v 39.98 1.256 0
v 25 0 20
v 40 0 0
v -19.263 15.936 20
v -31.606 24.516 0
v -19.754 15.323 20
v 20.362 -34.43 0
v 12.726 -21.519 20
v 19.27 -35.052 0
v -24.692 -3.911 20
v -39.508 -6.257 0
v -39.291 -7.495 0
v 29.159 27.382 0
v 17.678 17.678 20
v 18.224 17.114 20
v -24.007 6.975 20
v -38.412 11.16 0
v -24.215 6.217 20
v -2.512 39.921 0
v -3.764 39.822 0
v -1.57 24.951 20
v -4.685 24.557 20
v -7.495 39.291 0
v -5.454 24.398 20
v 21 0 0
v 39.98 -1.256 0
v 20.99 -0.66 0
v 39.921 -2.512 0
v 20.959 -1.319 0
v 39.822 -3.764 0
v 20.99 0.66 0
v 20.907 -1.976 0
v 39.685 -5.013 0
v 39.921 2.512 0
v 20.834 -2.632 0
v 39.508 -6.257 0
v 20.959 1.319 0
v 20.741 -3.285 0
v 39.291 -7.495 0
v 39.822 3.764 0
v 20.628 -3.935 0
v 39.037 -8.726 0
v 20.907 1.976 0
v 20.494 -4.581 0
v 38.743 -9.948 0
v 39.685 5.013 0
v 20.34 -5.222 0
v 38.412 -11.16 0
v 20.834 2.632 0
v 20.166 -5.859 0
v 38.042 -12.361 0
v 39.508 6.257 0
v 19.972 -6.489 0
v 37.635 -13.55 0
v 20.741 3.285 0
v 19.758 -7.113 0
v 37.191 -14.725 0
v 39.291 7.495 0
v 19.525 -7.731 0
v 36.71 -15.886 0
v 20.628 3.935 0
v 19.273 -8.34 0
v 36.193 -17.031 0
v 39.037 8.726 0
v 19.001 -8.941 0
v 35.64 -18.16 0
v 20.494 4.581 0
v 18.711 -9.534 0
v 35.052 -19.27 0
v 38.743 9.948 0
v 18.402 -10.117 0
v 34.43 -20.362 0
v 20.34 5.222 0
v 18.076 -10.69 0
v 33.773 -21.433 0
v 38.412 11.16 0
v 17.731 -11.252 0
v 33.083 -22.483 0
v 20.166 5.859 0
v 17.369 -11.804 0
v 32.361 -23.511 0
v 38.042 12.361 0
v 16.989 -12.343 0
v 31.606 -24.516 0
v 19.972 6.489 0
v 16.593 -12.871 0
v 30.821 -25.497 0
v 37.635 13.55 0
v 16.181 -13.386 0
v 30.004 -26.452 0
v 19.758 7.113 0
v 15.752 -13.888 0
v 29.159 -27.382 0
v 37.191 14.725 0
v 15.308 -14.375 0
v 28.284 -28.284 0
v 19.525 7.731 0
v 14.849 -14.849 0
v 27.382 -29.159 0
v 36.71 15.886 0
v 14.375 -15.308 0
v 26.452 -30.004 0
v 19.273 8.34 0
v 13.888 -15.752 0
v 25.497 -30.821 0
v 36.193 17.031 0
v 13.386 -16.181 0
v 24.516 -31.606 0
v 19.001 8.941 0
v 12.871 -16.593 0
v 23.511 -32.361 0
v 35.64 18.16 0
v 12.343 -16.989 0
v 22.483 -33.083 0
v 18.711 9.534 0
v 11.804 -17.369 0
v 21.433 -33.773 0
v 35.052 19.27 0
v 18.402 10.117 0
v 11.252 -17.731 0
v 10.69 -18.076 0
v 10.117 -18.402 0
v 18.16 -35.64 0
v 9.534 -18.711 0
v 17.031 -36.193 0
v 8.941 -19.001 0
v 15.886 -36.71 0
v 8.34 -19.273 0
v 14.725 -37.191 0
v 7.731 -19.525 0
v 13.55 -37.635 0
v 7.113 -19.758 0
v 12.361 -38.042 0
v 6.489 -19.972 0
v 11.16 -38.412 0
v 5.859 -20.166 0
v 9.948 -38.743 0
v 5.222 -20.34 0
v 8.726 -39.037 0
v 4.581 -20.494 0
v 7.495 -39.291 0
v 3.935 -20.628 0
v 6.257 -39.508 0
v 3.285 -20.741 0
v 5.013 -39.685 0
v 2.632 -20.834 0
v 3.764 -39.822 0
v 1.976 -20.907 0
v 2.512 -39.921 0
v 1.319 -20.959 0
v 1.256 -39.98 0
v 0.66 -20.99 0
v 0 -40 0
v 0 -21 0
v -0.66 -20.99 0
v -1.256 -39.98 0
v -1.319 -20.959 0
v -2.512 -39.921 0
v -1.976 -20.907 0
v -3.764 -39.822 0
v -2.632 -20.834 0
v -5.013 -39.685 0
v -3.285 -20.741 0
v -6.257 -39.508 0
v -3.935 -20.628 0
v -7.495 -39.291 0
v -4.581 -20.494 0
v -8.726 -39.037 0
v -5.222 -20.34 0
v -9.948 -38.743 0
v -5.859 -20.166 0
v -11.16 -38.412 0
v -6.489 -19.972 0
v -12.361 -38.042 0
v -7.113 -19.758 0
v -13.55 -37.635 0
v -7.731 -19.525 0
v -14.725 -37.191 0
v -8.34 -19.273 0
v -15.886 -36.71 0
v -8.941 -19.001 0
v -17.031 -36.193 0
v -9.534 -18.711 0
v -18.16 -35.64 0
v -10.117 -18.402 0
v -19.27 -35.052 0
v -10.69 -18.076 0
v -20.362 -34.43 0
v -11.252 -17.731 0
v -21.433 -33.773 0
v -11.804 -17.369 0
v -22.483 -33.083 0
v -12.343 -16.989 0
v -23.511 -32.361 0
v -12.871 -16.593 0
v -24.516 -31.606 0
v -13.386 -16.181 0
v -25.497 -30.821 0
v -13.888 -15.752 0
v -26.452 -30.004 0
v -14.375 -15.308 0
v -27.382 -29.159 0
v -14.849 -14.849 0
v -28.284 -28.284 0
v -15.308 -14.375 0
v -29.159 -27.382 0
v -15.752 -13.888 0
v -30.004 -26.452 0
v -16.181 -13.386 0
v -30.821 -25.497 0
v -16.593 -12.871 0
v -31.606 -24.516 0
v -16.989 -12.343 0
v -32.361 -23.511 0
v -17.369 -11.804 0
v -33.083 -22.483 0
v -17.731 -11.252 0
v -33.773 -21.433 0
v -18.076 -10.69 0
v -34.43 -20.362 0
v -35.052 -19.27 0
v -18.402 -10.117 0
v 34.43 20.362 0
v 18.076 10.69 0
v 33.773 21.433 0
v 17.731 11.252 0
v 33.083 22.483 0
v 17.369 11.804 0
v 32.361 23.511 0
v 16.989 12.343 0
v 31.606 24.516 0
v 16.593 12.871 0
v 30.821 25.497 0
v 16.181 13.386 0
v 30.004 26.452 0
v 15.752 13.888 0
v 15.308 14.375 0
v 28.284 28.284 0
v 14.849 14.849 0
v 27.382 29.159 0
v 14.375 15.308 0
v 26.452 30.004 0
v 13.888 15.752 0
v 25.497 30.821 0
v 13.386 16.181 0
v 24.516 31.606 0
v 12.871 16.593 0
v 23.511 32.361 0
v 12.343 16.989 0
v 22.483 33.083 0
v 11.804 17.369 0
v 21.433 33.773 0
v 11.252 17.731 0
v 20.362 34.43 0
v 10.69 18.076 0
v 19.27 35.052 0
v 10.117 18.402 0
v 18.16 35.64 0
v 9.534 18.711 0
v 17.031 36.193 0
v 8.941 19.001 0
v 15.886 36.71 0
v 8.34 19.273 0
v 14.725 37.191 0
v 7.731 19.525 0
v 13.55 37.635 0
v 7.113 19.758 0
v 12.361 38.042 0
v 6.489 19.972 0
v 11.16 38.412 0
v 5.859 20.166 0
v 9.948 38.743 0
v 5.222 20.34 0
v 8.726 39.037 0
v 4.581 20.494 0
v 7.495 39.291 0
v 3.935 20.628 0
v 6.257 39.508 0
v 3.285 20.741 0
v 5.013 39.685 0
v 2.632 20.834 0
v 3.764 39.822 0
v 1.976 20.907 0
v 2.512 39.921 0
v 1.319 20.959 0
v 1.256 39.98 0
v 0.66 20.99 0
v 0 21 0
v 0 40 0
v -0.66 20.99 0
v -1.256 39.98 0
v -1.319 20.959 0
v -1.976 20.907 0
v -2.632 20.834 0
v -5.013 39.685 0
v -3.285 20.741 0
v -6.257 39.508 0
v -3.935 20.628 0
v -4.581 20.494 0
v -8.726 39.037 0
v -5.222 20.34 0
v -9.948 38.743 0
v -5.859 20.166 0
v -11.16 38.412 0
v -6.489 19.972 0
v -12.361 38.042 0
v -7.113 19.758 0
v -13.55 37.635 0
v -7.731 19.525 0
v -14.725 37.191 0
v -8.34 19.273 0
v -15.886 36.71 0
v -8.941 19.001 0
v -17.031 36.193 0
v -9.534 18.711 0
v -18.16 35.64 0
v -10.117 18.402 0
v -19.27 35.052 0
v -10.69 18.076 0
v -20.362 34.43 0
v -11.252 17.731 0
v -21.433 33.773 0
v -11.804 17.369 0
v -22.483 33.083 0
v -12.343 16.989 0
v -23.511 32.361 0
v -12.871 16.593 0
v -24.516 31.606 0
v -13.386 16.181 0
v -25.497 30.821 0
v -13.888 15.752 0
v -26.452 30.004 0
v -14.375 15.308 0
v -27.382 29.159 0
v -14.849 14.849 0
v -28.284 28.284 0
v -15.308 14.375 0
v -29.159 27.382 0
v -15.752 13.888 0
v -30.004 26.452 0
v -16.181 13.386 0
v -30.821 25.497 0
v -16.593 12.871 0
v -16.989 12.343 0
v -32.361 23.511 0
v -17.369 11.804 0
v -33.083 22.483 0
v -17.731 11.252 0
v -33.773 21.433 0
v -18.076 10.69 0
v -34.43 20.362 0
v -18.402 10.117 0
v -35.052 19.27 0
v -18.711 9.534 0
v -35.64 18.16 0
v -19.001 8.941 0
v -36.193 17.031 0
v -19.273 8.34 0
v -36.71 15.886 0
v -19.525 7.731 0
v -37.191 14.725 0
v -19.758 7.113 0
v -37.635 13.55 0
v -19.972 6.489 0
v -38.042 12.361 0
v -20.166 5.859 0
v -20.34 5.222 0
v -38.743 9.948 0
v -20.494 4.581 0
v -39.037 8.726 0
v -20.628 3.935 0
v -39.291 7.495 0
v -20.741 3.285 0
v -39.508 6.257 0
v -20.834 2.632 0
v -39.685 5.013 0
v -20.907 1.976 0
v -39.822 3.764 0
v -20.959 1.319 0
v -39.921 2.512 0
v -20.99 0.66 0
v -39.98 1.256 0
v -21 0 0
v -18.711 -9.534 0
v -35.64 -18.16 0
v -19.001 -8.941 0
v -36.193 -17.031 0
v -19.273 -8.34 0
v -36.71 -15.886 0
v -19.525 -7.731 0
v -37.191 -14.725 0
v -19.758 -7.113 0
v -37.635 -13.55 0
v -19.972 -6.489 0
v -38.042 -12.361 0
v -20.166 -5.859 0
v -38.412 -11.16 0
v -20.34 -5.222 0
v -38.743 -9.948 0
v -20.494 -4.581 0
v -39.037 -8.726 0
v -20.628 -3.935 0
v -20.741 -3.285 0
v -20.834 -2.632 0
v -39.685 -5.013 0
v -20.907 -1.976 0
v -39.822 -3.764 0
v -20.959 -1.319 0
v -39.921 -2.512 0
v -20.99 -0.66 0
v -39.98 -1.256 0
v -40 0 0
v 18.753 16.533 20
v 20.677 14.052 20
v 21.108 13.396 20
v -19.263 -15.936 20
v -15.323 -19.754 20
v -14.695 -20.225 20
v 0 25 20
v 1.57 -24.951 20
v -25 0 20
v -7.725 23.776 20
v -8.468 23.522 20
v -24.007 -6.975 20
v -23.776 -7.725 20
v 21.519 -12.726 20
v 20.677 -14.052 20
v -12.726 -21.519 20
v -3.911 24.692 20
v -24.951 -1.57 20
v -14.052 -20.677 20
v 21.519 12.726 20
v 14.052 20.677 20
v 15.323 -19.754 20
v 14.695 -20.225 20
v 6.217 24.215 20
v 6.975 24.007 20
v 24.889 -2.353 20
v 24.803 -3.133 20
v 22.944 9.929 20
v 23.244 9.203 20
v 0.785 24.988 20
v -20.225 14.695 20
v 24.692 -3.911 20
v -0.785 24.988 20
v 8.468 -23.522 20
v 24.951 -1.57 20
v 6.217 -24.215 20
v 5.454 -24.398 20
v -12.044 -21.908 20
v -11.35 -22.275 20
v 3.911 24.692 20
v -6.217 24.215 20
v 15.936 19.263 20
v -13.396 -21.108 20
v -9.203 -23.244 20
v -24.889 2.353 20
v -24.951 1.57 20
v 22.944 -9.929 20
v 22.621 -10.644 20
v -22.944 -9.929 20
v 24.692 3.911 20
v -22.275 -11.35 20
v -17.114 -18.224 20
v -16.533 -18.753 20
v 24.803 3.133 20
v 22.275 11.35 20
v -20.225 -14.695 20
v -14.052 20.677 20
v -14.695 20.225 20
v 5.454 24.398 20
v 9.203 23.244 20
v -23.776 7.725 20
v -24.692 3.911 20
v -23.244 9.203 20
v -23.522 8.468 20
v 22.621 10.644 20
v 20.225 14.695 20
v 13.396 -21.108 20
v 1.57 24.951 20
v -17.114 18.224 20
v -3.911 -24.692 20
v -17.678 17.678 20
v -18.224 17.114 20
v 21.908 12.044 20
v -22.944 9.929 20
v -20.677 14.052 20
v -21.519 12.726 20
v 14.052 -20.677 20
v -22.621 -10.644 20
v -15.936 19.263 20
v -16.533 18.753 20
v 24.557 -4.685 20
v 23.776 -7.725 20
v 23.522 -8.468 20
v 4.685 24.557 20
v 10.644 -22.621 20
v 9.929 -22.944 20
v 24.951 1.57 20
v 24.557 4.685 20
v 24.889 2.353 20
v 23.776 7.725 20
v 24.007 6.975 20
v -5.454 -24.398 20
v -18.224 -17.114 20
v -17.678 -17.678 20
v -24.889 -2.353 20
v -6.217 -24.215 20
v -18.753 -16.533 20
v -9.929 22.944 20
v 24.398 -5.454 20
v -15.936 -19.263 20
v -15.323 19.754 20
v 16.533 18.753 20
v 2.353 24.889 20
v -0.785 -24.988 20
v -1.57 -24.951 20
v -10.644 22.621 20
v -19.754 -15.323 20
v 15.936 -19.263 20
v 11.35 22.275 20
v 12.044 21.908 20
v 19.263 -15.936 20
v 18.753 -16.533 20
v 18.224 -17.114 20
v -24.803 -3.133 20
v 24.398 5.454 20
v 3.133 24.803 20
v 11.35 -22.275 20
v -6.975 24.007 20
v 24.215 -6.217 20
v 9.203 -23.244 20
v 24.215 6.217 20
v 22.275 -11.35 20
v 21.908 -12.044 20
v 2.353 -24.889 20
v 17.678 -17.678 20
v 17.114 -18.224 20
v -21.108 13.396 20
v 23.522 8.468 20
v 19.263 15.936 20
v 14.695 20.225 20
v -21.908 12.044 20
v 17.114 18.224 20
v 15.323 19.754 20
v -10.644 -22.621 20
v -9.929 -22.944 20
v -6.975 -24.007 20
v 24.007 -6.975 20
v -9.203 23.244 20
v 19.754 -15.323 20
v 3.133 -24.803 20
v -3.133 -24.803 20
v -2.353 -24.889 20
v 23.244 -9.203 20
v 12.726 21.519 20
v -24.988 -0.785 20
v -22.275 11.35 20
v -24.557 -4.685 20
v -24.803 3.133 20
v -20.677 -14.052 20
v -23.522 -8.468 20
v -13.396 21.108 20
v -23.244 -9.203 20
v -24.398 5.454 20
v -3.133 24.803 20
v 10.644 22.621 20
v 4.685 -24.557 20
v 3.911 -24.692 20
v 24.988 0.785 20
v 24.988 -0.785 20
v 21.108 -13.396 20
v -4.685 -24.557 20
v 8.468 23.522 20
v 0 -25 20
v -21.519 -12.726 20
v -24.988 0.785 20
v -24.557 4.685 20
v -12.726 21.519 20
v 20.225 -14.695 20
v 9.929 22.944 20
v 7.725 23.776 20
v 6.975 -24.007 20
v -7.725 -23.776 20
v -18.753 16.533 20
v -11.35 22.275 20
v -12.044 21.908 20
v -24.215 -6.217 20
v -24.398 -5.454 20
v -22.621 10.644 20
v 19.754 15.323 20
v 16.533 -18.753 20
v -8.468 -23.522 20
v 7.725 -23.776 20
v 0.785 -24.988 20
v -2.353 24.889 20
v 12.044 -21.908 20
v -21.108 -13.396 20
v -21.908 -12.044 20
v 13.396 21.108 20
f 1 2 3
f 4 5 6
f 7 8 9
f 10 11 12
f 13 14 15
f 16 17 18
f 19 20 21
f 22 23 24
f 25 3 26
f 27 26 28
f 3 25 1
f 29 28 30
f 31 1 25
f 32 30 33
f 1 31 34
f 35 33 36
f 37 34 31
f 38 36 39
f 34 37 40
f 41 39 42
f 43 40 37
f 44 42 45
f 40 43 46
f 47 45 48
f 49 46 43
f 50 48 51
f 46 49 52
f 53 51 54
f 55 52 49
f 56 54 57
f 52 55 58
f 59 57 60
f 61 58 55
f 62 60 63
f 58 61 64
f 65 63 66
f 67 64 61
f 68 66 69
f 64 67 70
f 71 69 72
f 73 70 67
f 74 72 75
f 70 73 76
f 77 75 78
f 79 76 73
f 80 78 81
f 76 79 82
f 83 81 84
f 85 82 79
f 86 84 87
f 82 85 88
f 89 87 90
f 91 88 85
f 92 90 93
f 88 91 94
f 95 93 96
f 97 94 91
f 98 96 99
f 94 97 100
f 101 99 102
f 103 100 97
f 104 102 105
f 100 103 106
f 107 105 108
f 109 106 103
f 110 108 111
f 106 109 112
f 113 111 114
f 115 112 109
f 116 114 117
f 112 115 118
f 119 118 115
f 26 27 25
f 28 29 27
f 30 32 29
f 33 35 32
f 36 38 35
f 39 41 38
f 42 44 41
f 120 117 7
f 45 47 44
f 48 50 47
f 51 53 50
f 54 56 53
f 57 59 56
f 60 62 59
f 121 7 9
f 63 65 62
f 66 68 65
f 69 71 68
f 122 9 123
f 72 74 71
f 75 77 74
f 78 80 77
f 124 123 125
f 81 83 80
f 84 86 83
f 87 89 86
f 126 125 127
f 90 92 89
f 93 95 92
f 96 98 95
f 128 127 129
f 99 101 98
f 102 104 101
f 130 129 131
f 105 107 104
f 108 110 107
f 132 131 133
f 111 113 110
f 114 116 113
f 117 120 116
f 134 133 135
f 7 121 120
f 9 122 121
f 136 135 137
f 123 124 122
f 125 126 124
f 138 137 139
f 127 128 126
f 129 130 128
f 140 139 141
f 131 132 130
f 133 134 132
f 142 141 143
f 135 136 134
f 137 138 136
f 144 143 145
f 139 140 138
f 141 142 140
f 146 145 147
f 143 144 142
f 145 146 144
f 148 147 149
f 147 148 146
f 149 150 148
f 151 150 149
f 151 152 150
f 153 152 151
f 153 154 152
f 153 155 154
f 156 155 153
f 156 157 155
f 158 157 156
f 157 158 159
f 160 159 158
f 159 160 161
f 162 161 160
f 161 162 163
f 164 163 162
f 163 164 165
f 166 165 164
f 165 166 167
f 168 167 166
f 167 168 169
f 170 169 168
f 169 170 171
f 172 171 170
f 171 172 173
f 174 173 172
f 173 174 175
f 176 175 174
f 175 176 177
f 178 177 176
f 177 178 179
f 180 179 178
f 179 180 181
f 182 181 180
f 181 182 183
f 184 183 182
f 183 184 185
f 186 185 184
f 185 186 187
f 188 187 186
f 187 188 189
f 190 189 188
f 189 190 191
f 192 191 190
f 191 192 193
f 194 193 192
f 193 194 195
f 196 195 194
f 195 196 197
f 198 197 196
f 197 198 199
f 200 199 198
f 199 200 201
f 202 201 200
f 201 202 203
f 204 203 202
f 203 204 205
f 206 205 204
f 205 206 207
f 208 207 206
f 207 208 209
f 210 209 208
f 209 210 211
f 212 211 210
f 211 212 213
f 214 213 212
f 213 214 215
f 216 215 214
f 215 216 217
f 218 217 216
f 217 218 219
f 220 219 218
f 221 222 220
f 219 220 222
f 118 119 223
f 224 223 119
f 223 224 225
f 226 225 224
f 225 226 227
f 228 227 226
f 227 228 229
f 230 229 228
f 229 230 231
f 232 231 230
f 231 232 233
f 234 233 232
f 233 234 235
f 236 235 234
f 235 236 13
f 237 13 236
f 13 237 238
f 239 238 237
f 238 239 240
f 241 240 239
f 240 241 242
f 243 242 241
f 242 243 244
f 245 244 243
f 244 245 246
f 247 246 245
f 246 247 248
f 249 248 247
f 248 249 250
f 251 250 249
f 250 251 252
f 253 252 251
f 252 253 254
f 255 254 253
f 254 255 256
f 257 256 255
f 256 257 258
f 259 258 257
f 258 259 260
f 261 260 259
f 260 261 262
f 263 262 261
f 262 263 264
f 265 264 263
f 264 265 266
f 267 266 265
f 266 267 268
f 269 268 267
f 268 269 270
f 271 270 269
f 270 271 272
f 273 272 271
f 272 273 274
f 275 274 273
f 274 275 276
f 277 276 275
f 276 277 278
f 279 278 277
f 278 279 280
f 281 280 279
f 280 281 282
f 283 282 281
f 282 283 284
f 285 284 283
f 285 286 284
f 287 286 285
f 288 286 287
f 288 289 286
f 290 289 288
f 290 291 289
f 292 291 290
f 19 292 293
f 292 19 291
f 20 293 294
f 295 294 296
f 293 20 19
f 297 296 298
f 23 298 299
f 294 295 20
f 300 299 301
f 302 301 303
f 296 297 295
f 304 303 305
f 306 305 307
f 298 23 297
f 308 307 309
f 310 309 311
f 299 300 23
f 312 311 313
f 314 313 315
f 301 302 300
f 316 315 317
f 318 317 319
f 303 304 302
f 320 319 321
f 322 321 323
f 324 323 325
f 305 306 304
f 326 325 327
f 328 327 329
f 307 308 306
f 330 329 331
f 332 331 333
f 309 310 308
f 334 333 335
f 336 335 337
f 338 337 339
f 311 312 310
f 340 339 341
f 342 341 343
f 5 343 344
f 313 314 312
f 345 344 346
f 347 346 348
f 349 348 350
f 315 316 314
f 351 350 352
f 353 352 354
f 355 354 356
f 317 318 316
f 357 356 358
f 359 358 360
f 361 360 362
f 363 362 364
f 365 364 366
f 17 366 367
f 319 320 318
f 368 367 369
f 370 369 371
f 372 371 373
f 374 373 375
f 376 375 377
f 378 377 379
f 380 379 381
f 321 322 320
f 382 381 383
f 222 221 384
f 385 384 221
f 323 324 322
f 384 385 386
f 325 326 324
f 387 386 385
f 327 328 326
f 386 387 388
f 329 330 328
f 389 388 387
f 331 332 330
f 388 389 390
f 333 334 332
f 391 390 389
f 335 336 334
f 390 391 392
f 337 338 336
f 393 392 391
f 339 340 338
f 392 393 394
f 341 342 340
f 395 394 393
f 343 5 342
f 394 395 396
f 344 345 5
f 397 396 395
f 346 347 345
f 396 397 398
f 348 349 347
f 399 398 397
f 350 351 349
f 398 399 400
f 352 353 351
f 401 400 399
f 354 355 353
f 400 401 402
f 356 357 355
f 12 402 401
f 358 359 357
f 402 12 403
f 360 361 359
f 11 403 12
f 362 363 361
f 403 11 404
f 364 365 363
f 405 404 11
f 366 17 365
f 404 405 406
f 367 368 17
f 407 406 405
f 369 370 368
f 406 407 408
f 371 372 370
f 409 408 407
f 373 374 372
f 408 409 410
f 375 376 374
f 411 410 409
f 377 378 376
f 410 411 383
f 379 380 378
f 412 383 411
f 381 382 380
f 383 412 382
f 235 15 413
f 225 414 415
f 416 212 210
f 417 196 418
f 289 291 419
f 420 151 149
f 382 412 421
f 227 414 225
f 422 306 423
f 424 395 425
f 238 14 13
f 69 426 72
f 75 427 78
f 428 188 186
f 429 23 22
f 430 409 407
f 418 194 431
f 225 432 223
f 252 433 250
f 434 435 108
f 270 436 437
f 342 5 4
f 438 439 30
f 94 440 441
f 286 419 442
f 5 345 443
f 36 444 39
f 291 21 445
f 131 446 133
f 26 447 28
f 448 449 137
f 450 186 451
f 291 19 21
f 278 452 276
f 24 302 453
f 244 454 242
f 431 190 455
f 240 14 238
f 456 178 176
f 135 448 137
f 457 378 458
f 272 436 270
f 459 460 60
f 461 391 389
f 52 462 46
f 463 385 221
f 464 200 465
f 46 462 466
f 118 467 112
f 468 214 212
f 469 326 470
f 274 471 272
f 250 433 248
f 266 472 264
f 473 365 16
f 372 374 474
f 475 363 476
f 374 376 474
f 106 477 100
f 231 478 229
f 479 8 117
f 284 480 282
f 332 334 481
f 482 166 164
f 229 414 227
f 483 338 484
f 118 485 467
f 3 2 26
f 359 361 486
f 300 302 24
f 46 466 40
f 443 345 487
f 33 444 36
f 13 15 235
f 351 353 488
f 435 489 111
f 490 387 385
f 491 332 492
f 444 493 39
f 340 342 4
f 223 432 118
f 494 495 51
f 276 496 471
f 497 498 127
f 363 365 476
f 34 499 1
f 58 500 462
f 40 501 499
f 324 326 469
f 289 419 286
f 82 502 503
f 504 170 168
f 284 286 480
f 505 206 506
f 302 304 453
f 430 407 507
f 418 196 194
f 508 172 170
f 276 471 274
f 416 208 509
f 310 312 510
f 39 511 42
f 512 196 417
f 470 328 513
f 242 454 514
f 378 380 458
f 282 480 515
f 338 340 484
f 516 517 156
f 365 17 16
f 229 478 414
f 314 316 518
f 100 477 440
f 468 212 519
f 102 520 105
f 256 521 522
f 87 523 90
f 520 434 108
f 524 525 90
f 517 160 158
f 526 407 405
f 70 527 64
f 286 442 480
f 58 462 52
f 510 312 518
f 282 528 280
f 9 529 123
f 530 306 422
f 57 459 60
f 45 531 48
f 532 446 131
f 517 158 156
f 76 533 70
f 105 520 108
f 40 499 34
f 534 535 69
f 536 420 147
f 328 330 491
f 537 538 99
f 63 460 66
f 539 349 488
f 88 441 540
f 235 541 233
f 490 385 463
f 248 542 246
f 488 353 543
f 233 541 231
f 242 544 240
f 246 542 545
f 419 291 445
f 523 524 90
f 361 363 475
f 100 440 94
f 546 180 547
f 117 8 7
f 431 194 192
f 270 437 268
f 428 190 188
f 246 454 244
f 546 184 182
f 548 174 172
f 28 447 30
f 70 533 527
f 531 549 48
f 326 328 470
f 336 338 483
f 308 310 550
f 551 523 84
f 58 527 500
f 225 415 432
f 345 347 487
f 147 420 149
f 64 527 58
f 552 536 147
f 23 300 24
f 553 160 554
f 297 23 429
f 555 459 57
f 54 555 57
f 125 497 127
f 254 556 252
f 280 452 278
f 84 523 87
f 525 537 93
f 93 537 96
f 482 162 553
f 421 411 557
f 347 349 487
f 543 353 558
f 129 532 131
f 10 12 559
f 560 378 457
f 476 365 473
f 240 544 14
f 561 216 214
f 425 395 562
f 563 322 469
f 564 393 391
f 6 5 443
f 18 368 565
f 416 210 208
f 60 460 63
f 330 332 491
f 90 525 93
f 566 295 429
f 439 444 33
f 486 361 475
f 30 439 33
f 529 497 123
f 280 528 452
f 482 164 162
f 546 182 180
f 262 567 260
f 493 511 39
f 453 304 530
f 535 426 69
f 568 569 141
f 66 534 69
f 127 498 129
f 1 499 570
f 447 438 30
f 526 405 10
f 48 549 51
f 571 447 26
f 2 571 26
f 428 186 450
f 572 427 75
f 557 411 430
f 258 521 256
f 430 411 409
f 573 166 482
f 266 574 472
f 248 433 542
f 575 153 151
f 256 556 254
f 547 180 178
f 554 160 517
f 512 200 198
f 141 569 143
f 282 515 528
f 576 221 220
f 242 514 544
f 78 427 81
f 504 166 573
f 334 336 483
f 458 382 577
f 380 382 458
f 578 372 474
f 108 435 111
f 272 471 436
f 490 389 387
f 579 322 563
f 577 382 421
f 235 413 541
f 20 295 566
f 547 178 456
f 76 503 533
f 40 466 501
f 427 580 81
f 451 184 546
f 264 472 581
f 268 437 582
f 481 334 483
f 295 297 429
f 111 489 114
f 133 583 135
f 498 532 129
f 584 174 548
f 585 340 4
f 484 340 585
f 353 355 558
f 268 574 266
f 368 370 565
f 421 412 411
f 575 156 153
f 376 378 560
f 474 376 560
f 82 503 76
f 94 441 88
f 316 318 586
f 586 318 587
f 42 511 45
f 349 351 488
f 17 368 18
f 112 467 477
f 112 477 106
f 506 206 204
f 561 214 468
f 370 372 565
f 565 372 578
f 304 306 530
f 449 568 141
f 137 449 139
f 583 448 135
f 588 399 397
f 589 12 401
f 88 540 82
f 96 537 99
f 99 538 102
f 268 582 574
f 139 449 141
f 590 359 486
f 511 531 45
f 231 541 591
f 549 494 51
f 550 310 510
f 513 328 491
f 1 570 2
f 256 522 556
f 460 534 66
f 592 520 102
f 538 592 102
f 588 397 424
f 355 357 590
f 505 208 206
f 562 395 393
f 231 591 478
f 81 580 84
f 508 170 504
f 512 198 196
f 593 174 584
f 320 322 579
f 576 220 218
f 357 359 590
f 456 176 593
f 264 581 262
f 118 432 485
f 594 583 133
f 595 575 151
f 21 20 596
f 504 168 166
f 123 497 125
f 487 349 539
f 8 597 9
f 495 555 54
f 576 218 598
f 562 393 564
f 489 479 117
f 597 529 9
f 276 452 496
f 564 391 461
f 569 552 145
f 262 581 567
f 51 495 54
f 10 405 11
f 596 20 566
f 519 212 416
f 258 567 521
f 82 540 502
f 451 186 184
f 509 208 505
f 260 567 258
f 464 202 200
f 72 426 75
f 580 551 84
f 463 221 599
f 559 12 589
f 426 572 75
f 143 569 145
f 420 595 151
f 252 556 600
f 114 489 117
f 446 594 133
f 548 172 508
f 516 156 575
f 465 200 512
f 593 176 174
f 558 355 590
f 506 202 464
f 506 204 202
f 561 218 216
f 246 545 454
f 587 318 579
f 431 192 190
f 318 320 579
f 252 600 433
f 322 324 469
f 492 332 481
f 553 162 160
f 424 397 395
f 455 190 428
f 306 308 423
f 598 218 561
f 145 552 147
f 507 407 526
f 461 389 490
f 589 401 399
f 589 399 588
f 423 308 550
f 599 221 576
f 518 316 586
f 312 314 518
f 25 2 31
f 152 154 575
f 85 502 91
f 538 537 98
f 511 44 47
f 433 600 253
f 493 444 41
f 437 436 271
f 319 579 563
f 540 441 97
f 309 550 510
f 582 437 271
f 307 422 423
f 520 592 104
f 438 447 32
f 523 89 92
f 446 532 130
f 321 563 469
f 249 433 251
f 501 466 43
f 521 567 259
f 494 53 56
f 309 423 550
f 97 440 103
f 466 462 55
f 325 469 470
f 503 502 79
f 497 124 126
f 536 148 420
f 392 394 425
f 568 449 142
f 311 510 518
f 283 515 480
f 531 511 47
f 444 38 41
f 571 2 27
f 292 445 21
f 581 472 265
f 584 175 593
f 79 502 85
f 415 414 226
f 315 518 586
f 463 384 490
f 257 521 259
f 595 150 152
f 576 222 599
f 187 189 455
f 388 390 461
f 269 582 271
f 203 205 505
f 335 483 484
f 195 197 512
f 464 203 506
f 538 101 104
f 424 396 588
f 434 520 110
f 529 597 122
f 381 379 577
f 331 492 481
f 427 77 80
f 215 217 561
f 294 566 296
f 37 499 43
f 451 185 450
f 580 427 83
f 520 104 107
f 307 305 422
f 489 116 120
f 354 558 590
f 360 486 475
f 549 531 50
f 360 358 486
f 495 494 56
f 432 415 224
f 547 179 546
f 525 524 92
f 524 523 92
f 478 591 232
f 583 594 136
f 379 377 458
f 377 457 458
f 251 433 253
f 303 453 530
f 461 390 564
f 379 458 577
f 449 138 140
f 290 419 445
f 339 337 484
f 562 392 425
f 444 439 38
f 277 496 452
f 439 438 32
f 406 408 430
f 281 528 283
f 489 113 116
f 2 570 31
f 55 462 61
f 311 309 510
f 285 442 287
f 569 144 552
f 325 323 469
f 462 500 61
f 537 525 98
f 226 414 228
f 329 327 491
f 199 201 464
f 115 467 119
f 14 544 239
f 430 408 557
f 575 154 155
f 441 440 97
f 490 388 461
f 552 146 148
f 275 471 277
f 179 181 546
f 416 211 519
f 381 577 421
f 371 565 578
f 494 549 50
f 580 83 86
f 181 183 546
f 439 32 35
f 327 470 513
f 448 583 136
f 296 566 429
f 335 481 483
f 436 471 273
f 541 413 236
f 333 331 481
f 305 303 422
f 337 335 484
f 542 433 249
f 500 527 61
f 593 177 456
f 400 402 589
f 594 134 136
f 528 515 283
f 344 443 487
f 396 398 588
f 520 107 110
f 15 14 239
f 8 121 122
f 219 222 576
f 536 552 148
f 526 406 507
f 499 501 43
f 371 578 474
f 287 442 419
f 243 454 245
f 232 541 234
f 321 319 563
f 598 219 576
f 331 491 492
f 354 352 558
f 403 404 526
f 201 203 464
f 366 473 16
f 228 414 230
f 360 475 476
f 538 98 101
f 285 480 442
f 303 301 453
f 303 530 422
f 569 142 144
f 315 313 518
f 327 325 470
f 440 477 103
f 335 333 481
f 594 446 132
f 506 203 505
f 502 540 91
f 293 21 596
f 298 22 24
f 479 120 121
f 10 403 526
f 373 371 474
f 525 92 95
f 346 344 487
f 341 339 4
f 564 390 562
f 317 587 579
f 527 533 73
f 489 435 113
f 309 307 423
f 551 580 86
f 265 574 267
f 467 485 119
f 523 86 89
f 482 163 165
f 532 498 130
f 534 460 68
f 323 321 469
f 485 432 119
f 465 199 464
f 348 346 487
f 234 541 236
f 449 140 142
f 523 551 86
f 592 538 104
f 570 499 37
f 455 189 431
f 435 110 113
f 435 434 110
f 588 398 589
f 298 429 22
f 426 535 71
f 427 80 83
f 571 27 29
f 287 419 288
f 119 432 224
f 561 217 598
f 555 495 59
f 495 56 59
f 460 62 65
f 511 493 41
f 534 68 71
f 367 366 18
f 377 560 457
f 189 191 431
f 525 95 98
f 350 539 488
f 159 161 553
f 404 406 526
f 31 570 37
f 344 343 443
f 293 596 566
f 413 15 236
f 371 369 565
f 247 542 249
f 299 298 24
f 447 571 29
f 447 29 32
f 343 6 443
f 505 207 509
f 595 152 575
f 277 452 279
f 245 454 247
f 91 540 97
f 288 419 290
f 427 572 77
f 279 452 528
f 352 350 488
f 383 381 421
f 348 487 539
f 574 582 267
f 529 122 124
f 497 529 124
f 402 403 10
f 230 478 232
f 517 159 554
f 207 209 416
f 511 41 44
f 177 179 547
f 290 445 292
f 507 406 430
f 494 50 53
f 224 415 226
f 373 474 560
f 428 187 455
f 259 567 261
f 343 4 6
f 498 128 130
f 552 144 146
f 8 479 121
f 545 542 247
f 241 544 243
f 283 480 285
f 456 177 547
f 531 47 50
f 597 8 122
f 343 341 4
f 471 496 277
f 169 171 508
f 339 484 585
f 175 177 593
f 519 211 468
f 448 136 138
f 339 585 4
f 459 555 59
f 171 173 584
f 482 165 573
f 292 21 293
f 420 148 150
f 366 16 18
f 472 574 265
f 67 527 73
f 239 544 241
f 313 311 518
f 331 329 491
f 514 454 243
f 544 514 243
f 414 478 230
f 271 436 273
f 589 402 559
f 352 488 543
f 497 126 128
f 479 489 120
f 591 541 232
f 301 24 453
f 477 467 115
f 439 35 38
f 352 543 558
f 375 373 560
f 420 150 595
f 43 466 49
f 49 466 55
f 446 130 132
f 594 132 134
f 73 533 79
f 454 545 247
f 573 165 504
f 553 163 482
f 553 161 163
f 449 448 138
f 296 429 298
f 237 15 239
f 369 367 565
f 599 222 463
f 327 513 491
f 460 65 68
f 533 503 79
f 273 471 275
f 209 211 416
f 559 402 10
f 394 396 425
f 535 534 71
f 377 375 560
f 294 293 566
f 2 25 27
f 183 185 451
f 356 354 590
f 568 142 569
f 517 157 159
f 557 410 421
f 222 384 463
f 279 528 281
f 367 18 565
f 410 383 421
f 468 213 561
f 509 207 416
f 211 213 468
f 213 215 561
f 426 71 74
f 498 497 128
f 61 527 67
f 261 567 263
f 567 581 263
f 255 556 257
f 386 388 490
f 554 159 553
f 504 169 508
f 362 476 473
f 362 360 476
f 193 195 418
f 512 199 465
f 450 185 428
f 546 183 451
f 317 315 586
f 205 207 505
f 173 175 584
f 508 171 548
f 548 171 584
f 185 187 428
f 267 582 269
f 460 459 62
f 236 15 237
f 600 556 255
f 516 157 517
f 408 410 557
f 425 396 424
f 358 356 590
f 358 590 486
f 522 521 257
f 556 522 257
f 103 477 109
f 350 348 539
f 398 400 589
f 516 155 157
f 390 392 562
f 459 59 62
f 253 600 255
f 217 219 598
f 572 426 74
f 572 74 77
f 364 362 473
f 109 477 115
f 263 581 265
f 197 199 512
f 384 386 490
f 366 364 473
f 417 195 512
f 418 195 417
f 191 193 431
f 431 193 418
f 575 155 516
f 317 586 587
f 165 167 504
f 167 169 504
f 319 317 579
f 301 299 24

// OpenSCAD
$fn=200;
difference() {
    cylinder(r1=40,r2=25,h=20);
    cylinder(r2=25,r1=42/2,h=20);
}
